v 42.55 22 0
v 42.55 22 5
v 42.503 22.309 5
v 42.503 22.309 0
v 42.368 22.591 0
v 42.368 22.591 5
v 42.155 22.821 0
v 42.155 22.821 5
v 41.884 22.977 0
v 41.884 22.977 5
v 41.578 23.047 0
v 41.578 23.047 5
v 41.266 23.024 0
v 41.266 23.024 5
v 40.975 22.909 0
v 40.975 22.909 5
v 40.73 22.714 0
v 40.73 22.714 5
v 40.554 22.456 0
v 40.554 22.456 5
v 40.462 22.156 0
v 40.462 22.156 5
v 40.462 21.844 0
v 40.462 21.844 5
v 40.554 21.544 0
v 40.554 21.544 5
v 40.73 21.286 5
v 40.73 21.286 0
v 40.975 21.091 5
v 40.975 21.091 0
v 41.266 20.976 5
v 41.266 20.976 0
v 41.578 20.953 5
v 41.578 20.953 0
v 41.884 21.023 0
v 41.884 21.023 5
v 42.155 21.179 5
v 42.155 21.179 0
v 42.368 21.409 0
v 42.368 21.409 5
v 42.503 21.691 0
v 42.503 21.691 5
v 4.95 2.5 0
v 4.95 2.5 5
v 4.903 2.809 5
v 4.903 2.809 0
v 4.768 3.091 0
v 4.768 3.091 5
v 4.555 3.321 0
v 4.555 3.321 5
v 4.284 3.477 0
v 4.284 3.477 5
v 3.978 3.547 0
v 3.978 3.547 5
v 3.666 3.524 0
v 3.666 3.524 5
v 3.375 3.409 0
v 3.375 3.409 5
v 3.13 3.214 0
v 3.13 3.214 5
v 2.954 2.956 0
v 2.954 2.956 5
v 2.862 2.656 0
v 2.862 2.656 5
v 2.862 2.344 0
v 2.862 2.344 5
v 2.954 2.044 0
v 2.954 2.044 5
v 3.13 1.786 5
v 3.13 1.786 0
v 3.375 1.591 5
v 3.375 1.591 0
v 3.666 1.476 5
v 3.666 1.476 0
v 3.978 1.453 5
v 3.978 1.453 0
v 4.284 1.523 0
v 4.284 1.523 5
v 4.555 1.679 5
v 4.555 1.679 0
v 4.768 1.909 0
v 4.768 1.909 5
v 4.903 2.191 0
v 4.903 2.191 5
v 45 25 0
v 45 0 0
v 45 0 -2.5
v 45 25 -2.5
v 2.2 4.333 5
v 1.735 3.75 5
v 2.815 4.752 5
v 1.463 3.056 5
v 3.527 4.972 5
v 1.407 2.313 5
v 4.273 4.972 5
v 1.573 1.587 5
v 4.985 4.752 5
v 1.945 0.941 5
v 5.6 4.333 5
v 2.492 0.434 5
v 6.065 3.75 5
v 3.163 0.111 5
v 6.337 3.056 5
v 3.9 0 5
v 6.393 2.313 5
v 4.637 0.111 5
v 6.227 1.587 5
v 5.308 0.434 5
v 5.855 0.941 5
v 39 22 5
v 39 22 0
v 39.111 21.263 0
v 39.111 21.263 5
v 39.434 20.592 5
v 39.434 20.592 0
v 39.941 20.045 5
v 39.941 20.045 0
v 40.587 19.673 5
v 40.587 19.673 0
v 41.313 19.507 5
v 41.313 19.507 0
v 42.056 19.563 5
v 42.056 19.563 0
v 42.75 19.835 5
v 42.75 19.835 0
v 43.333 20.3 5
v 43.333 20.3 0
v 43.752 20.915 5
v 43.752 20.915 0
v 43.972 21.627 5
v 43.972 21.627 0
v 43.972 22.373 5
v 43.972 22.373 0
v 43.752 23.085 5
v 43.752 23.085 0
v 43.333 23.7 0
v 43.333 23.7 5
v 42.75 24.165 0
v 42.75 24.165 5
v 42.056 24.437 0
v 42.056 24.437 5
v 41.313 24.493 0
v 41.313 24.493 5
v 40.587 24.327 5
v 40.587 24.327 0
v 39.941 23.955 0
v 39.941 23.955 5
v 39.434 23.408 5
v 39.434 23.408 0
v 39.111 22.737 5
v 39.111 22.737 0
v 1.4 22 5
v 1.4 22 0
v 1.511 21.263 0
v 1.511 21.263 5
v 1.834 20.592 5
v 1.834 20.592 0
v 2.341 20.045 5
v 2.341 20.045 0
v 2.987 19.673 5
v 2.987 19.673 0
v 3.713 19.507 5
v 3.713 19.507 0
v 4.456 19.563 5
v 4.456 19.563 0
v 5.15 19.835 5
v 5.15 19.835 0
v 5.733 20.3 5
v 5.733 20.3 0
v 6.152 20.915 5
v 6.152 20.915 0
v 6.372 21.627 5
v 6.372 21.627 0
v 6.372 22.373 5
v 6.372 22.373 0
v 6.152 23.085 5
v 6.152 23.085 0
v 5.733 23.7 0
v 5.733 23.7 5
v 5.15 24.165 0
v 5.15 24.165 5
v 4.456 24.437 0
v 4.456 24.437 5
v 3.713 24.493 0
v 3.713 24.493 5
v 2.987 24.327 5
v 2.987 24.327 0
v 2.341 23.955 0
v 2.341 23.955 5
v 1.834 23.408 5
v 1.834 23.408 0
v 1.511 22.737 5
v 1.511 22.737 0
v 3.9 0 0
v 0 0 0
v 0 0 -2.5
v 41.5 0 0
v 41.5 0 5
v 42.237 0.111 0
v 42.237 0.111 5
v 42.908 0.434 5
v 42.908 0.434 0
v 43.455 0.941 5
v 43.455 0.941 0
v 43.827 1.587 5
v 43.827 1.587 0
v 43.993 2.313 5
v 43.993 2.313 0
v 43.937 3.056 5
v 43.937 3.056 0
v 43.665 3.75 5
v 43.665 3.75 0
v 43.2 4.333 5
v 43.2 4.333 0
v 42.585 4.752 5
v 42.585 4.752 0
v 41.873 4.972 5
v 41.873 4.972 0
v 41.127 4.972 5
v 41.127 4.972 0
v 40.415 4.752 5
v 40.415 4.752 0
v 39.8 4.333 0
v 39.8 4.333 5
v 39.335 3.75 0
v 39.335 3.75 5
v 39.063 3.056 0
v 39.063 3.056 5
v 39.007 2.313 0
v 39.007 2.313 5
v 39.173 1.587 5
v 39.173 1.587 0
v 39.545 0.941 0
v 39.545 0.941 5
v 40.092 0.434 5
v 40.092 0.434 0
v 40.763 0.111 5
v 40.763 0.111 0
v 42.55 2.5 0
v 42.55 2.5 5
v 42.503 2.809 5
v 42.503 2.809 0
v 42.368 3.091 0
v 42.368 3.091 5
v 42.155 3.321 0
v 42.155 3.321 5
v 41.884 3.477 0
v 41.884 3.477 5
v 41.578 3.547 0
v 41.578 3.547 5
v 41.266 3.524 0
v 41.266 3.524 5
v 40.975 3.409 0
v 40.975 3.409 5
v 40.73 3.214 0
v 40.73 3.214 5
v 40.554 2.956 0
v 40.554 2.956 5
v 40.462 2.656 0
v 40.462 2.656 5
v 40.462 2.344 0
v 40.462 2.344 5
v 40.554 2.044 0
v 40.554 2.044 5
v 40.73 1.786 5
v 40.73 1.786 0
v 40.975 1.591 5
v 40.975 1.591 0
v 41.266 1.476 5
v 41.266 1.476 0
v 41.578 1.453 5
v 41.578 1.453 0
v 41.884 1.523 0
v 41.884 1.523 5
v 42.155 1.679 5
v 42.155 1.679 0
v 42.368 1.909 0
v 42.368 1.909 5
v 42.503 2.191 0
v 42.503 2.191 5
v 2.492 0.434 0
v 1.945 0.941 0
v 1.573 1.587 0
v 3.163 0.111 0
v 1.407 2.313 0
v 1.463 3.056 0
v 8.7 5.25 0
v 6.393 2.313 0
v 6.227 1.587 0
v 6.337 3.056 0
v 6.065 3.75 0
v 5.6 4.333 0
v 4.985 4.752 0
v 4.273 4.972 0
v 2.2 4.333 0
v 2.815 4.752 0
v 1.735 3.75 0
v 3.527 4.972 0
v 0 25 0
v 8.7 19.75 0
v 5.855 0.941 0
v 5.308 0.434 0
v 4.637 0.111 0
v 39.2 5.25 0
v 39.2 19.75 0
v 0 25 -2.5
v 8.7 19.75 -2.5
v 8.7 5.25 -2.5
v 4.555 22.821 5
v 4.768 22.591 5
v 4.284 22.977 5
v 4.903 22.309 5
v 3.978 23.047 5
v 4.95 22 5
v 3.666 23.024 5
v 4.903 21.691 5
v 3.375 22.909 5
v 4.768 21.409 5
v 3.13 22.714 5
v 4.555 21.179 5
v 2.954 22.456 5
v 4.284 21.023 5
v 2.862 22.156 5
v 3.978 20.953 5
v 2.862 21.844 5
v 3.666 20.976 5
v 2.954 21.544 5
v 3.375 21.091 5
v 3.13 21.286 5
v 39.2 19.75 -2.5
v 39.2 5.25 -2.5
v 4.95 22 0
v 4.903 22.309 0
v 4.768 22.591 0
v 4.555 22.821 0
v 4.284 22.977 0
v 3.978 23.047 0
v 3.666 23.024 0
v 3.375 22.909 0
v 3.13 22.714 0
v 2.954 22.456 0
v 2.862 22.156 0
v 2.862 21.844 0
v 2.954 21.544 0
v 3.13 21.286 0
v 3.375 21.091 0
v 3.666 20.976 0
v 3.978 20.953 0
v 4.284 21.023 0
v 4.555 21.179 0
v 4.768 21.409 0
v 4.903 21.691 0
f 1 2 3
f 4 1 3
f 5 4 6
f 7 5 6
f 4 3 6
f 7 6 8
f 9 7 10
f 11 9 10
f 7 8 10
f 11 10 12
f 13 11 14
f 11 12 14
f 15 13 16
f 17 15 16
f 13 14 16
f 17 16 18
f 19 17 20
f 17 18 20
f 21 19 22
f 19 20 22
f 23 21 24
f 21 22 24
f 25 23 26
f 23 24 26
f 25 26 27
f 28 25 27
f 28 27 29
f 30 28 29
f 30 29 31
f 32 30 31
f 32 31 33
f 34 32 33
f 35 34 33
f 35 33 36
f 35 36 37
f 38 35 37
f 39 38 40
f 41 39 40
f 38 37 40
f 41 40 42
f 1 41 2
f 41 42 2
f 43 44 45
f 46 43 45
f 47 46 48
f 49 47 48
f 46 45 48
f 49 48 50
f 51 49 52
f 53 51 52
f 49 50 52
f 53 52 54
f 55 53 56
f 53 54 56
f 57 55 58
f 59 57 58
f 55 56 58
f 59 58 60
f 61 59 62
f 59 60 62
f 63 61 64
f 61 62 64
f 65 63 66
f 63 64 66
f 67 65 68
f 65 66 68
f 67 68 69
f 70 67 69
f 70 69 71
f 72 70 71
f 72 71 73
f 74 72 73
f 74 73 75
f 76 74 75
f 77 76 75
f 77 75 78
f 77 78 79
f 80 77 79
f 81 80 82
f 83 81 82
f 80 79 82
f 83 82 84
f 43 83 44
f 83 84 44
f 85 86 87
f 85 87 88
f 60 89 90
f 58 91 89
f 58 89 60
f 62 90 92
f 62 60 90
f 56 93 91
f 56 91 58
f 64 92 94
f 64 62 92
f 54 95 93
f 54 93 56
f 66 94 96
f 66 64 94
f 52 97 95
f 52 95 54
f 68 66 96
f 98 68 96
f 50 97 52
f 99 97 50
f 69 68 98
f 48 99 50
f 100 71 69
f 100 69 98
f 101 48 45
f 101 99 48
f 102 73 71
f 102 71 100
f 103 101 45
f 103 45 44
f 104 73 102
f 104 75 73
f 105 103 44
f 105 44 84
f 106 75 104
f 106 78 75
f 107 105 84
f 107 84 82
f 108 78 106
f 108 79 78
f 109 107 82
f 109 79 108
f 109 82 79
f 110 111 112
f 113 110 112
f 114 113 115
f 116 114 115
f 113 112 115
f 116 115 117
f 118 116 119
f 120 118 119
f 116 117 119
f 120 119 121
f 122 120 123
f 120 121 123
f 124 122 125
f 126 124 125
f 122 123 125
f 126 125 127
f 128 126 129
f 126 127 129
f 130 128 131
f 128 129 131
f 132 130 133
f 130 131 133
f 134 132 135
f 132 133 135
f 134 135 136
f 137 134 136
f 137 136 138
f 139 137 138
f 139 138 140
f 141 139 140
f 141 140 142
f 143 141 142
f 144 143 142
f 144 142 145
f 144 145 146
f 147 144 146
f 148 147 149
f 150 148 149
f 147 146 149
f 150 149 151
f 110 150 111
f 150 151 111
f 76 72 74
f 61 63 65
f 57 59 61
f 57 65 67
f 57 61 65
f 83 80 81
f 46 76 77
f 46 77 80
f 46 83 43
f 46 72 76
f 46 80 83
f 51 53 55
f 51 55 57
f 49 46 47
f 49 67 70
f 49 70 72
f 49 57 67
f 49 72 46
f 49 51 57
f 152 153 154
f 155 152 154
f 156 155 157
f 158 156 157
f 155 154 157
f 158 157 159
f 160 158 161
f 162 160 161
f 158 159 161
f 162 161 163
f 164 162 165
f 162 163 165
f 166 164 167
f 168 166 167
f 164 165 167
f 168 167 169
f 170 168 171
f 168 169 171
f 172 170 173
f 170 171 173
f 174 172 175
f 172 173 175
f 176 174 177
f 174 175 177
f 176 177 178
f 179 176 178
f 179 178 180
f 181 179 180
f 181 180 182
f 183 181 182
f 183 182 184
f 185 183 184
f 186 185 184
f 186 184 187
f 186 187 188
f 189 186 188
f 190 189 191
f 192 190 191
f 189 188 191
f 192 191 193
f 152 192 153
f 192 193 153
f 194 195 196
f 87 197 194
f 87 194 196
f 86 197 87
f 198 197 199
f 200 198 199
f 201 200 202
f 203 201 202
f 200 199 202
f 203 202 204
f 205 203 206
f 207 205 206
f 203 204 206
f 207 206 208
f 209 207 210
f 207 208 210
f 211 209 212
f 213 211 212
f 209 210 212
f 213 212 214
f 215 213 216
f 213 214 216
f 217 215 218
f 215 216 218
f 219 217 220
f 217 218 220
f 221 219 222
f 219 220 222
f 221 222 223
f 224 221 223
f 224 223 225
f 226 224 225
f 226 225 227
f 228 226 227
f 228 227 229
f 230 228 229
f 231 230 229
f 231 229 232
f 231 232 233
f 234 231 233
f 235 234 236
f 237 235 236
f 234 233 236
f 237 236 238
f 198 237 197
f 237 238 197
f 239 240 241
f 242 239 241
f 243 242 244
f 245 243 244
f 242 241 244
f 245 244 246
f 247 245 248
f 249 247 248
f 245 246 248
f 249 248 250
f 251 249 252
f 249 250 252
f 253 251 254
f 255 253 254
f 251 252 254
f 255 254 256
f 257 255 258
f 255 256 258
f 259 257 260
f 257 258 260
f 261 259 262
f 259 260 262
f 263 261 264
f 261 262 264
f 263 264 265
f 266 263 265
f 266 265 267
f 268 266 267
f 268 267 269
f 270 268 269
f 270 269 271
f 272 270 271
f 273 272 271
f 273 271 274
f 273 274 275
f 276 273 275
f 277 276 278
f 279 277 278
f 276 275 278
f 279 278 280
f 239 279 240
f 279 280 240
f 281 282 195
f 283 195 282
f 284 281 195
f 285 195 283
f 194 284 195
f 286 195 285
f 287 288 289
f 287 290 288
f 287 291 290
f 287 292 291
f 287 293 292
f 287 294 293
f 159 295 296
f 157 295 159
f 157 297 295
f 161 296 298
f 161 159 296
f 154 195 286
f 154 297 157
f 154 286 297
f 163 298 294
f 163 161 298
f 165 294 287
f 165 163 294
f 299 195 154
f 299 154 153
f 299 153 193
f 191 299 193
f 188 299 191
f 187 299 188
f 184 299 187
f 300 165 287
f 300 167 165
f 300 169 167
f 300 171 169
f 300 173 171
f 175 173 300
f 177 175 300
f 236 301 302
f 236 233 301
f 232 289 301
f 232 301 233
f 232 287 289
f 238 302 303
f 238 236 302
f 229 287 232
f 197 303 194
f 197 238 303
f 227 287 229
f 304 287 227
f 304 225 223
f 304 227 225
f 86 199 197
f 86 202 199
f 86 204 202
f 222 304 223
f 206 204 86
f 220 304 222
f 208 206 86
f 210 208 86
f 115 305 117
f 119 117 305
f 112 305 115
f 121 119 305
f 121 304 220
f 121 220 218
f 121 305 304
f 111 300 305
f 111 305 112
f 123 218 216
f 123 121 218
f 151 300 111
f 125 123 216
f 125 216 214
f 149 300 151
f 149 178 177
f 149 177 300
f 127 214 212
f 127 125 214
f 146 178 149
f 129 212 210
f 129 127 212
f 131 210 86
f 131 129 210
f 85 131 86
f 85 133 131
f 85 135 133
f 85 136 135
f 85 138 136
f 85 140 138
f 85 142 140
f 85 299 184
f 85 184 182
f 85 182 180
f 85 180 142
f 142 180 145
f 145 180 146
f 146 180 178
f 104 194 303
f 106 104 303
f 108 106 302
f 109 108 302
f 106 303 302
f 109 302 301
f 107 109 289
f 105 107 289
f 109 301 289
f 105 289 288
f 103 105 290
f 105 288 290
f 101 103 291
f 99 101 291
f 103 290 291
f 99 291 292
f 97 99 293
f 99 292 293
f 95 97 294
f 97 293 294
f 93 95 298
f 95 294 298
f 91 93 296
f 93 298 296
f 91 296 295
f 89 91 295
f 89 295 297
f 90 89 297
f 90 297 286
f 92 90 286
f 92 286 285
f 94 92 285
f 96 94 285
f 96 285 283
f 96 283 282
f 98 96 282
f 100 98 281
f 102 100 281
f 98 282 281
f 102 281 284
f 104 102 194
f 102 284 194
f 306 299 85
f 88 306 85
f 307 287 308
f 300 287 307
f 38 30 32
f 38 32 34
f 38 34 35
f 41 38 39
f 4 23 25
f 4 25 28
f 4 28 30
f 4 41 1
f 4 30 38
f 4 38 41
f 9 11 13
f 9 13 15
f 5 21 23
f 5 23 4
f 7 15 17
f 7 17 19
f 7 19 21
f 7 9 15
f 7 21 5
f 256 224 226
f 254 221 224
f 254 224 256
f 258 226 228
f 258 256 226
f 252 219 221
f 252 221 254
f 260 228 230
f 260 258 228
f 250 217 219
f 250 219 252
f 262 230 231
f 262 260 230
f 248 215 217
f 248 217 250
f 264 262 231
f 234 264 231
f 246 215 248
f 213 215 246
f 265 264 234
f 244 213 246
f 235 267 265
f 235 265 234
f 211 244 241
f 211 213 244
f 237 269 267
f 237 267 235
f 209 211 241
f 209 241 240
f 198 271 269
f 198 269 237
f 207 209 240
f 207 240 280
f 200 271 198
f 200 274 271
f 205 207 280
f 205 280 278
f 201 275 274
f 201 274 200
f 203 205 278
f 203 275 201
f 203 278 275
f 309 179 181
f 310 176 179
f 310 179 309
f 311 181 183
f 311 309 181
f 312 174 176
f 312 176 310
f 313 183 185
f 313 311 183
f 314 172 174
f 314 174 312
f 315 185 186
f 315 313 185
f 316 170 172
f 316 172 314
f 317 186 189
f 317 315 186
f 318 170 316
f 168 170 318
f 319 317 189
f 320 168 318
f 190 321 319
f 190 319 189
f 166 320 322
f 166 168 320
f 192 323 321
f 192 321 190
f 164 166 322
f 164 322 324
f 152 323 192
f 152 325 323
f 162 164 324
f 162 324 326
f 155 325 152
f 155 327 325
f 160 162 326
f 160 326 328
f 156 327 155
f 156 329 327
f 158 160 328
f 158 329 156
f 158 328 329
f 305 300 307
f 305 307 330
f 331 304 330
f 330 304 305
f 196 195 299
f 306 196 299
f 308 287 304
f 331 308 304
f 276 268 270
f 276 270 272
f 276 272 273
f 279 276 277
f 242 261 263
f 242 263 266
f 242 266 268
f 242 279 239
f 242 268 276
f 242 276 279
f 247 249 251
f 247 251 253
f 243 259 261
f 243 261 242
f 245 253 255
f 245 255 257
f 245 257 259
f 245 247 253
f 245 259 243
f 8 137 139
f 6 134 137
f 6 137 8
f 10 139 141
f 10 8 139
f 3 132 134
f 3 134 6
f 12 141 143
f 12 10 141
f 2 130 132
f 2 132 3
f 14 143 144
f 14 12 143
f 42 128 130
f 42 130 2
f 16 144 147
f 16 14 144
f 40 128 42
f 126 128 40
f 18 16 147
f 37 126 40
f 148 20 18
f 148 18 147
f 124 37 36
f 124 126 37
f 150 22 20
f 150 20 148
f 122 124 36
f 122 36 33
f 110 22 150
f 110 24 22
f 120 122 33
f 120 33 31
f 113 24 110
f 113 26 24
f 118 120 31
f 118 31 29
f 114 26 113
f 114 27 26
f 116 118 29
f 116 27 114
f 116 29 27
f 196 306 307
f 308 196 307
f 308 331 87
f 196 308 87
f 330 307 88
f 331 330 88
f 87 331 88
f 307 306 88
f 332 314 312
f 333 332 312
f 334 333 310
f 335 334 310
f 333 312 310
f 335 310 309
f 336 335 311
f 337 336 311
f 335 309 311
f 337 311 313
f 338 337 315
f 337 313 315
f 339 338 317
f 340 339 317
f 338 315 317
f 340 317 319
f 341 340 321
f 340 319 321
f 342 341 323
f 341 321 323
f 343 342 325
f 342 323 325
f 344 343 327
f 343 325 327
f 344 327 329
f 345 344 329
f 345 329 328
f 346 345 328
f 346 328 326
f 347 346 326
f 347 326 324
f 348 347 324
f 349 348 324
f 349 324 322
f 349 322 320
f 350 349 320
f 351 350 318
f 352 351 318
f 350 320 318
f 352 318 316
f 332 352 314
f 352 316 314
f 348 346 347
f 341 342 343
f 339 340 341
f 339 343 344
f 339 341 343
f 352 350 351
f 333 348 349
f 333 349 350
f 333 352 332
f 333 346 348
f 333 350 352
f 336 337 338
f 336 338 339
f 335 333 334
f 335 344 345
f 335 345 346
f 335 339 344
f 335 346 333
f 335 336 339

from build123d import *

# Parameters (mm, degrees)
SKETCH1_W           = 45
SKETCH1_H           = 25
BOSS_EXTRUDE1_DEPTH = 2.5
SKETCH1_3_R         = 2.5
BOSS_EXTRUDE2_DEPTH = 5
SKETCH2_R           = 1.05
CUT_EXTRUDE1_DEPTH  = 5
SKETCH3_W           = 30.5
SKETCH3_H           = 14.5
CUT_EXTRUDE2_DEPTH  = 2.5


with BuildPart() as part:
    # Sketch1 → Boss-Extrude1 (new body)
    with BuildSketch(Plane.XY):
        with Locations((22.5, 12.5)):
            Rectangle(SKETCH1_W, SKETCH1_H)
    extrude(amount=-BOSS_EXTRUDE1_DEPTH)

    # Sketch1<3> → Boss-Extrude2 (add)
    with BuildSketch(Plane.XY):
        with Locations(Location((3.9, 22, 0), (0, 0, 180))):
            Circle(SKETCH1_3_R)
        with Locations(Location((3.9, 2.5, 0), (0, 0, 270))):
            Circle(SKETCH1_3_R)
        with Locations(Location((41.5, 2.5, 0), (0, 0, 270))):
            Circle(SKETCH1_3_R)
        with Locations(Location((41.5, 22, 0), (0, 0, 180))):
            Circle(SKETCH1_3_R)
    extrude(amount=BOSS_EXTRUDE2_DEPTH)

    # Sketch2 → Cut-Extrude1 (cut)
    with BuildSketch(Plane.XY.offset(5)):
        with Locations((3.9, 22)):
            Circle(SKETCH2_R)
        with Locations((3.9, 2.5)):
            Circle(SKETCH2_R)
        with Locations((41.5, 22)):
            Circle(SKETCH2_R)
        with Locations((41.5, 2.5)):
            Circle(SKETCH2_R)
    extrude(amount=-CUT_EXTRUDE1_DEPTH, mode=Mode.SUBTRACT)

    # Sketch3 → Cut-Extrude2 (cut)
    with BuildSketch(Plane.XY):
        with Locations((23.95, 12.5)):
            Rectangle(SKETCH3_W, SKETCH3_H)
    extrude(amount=-CUT_EXTRUDE2_DEPTH, mode=Mode.SUBTRACT)


solid = part.part
